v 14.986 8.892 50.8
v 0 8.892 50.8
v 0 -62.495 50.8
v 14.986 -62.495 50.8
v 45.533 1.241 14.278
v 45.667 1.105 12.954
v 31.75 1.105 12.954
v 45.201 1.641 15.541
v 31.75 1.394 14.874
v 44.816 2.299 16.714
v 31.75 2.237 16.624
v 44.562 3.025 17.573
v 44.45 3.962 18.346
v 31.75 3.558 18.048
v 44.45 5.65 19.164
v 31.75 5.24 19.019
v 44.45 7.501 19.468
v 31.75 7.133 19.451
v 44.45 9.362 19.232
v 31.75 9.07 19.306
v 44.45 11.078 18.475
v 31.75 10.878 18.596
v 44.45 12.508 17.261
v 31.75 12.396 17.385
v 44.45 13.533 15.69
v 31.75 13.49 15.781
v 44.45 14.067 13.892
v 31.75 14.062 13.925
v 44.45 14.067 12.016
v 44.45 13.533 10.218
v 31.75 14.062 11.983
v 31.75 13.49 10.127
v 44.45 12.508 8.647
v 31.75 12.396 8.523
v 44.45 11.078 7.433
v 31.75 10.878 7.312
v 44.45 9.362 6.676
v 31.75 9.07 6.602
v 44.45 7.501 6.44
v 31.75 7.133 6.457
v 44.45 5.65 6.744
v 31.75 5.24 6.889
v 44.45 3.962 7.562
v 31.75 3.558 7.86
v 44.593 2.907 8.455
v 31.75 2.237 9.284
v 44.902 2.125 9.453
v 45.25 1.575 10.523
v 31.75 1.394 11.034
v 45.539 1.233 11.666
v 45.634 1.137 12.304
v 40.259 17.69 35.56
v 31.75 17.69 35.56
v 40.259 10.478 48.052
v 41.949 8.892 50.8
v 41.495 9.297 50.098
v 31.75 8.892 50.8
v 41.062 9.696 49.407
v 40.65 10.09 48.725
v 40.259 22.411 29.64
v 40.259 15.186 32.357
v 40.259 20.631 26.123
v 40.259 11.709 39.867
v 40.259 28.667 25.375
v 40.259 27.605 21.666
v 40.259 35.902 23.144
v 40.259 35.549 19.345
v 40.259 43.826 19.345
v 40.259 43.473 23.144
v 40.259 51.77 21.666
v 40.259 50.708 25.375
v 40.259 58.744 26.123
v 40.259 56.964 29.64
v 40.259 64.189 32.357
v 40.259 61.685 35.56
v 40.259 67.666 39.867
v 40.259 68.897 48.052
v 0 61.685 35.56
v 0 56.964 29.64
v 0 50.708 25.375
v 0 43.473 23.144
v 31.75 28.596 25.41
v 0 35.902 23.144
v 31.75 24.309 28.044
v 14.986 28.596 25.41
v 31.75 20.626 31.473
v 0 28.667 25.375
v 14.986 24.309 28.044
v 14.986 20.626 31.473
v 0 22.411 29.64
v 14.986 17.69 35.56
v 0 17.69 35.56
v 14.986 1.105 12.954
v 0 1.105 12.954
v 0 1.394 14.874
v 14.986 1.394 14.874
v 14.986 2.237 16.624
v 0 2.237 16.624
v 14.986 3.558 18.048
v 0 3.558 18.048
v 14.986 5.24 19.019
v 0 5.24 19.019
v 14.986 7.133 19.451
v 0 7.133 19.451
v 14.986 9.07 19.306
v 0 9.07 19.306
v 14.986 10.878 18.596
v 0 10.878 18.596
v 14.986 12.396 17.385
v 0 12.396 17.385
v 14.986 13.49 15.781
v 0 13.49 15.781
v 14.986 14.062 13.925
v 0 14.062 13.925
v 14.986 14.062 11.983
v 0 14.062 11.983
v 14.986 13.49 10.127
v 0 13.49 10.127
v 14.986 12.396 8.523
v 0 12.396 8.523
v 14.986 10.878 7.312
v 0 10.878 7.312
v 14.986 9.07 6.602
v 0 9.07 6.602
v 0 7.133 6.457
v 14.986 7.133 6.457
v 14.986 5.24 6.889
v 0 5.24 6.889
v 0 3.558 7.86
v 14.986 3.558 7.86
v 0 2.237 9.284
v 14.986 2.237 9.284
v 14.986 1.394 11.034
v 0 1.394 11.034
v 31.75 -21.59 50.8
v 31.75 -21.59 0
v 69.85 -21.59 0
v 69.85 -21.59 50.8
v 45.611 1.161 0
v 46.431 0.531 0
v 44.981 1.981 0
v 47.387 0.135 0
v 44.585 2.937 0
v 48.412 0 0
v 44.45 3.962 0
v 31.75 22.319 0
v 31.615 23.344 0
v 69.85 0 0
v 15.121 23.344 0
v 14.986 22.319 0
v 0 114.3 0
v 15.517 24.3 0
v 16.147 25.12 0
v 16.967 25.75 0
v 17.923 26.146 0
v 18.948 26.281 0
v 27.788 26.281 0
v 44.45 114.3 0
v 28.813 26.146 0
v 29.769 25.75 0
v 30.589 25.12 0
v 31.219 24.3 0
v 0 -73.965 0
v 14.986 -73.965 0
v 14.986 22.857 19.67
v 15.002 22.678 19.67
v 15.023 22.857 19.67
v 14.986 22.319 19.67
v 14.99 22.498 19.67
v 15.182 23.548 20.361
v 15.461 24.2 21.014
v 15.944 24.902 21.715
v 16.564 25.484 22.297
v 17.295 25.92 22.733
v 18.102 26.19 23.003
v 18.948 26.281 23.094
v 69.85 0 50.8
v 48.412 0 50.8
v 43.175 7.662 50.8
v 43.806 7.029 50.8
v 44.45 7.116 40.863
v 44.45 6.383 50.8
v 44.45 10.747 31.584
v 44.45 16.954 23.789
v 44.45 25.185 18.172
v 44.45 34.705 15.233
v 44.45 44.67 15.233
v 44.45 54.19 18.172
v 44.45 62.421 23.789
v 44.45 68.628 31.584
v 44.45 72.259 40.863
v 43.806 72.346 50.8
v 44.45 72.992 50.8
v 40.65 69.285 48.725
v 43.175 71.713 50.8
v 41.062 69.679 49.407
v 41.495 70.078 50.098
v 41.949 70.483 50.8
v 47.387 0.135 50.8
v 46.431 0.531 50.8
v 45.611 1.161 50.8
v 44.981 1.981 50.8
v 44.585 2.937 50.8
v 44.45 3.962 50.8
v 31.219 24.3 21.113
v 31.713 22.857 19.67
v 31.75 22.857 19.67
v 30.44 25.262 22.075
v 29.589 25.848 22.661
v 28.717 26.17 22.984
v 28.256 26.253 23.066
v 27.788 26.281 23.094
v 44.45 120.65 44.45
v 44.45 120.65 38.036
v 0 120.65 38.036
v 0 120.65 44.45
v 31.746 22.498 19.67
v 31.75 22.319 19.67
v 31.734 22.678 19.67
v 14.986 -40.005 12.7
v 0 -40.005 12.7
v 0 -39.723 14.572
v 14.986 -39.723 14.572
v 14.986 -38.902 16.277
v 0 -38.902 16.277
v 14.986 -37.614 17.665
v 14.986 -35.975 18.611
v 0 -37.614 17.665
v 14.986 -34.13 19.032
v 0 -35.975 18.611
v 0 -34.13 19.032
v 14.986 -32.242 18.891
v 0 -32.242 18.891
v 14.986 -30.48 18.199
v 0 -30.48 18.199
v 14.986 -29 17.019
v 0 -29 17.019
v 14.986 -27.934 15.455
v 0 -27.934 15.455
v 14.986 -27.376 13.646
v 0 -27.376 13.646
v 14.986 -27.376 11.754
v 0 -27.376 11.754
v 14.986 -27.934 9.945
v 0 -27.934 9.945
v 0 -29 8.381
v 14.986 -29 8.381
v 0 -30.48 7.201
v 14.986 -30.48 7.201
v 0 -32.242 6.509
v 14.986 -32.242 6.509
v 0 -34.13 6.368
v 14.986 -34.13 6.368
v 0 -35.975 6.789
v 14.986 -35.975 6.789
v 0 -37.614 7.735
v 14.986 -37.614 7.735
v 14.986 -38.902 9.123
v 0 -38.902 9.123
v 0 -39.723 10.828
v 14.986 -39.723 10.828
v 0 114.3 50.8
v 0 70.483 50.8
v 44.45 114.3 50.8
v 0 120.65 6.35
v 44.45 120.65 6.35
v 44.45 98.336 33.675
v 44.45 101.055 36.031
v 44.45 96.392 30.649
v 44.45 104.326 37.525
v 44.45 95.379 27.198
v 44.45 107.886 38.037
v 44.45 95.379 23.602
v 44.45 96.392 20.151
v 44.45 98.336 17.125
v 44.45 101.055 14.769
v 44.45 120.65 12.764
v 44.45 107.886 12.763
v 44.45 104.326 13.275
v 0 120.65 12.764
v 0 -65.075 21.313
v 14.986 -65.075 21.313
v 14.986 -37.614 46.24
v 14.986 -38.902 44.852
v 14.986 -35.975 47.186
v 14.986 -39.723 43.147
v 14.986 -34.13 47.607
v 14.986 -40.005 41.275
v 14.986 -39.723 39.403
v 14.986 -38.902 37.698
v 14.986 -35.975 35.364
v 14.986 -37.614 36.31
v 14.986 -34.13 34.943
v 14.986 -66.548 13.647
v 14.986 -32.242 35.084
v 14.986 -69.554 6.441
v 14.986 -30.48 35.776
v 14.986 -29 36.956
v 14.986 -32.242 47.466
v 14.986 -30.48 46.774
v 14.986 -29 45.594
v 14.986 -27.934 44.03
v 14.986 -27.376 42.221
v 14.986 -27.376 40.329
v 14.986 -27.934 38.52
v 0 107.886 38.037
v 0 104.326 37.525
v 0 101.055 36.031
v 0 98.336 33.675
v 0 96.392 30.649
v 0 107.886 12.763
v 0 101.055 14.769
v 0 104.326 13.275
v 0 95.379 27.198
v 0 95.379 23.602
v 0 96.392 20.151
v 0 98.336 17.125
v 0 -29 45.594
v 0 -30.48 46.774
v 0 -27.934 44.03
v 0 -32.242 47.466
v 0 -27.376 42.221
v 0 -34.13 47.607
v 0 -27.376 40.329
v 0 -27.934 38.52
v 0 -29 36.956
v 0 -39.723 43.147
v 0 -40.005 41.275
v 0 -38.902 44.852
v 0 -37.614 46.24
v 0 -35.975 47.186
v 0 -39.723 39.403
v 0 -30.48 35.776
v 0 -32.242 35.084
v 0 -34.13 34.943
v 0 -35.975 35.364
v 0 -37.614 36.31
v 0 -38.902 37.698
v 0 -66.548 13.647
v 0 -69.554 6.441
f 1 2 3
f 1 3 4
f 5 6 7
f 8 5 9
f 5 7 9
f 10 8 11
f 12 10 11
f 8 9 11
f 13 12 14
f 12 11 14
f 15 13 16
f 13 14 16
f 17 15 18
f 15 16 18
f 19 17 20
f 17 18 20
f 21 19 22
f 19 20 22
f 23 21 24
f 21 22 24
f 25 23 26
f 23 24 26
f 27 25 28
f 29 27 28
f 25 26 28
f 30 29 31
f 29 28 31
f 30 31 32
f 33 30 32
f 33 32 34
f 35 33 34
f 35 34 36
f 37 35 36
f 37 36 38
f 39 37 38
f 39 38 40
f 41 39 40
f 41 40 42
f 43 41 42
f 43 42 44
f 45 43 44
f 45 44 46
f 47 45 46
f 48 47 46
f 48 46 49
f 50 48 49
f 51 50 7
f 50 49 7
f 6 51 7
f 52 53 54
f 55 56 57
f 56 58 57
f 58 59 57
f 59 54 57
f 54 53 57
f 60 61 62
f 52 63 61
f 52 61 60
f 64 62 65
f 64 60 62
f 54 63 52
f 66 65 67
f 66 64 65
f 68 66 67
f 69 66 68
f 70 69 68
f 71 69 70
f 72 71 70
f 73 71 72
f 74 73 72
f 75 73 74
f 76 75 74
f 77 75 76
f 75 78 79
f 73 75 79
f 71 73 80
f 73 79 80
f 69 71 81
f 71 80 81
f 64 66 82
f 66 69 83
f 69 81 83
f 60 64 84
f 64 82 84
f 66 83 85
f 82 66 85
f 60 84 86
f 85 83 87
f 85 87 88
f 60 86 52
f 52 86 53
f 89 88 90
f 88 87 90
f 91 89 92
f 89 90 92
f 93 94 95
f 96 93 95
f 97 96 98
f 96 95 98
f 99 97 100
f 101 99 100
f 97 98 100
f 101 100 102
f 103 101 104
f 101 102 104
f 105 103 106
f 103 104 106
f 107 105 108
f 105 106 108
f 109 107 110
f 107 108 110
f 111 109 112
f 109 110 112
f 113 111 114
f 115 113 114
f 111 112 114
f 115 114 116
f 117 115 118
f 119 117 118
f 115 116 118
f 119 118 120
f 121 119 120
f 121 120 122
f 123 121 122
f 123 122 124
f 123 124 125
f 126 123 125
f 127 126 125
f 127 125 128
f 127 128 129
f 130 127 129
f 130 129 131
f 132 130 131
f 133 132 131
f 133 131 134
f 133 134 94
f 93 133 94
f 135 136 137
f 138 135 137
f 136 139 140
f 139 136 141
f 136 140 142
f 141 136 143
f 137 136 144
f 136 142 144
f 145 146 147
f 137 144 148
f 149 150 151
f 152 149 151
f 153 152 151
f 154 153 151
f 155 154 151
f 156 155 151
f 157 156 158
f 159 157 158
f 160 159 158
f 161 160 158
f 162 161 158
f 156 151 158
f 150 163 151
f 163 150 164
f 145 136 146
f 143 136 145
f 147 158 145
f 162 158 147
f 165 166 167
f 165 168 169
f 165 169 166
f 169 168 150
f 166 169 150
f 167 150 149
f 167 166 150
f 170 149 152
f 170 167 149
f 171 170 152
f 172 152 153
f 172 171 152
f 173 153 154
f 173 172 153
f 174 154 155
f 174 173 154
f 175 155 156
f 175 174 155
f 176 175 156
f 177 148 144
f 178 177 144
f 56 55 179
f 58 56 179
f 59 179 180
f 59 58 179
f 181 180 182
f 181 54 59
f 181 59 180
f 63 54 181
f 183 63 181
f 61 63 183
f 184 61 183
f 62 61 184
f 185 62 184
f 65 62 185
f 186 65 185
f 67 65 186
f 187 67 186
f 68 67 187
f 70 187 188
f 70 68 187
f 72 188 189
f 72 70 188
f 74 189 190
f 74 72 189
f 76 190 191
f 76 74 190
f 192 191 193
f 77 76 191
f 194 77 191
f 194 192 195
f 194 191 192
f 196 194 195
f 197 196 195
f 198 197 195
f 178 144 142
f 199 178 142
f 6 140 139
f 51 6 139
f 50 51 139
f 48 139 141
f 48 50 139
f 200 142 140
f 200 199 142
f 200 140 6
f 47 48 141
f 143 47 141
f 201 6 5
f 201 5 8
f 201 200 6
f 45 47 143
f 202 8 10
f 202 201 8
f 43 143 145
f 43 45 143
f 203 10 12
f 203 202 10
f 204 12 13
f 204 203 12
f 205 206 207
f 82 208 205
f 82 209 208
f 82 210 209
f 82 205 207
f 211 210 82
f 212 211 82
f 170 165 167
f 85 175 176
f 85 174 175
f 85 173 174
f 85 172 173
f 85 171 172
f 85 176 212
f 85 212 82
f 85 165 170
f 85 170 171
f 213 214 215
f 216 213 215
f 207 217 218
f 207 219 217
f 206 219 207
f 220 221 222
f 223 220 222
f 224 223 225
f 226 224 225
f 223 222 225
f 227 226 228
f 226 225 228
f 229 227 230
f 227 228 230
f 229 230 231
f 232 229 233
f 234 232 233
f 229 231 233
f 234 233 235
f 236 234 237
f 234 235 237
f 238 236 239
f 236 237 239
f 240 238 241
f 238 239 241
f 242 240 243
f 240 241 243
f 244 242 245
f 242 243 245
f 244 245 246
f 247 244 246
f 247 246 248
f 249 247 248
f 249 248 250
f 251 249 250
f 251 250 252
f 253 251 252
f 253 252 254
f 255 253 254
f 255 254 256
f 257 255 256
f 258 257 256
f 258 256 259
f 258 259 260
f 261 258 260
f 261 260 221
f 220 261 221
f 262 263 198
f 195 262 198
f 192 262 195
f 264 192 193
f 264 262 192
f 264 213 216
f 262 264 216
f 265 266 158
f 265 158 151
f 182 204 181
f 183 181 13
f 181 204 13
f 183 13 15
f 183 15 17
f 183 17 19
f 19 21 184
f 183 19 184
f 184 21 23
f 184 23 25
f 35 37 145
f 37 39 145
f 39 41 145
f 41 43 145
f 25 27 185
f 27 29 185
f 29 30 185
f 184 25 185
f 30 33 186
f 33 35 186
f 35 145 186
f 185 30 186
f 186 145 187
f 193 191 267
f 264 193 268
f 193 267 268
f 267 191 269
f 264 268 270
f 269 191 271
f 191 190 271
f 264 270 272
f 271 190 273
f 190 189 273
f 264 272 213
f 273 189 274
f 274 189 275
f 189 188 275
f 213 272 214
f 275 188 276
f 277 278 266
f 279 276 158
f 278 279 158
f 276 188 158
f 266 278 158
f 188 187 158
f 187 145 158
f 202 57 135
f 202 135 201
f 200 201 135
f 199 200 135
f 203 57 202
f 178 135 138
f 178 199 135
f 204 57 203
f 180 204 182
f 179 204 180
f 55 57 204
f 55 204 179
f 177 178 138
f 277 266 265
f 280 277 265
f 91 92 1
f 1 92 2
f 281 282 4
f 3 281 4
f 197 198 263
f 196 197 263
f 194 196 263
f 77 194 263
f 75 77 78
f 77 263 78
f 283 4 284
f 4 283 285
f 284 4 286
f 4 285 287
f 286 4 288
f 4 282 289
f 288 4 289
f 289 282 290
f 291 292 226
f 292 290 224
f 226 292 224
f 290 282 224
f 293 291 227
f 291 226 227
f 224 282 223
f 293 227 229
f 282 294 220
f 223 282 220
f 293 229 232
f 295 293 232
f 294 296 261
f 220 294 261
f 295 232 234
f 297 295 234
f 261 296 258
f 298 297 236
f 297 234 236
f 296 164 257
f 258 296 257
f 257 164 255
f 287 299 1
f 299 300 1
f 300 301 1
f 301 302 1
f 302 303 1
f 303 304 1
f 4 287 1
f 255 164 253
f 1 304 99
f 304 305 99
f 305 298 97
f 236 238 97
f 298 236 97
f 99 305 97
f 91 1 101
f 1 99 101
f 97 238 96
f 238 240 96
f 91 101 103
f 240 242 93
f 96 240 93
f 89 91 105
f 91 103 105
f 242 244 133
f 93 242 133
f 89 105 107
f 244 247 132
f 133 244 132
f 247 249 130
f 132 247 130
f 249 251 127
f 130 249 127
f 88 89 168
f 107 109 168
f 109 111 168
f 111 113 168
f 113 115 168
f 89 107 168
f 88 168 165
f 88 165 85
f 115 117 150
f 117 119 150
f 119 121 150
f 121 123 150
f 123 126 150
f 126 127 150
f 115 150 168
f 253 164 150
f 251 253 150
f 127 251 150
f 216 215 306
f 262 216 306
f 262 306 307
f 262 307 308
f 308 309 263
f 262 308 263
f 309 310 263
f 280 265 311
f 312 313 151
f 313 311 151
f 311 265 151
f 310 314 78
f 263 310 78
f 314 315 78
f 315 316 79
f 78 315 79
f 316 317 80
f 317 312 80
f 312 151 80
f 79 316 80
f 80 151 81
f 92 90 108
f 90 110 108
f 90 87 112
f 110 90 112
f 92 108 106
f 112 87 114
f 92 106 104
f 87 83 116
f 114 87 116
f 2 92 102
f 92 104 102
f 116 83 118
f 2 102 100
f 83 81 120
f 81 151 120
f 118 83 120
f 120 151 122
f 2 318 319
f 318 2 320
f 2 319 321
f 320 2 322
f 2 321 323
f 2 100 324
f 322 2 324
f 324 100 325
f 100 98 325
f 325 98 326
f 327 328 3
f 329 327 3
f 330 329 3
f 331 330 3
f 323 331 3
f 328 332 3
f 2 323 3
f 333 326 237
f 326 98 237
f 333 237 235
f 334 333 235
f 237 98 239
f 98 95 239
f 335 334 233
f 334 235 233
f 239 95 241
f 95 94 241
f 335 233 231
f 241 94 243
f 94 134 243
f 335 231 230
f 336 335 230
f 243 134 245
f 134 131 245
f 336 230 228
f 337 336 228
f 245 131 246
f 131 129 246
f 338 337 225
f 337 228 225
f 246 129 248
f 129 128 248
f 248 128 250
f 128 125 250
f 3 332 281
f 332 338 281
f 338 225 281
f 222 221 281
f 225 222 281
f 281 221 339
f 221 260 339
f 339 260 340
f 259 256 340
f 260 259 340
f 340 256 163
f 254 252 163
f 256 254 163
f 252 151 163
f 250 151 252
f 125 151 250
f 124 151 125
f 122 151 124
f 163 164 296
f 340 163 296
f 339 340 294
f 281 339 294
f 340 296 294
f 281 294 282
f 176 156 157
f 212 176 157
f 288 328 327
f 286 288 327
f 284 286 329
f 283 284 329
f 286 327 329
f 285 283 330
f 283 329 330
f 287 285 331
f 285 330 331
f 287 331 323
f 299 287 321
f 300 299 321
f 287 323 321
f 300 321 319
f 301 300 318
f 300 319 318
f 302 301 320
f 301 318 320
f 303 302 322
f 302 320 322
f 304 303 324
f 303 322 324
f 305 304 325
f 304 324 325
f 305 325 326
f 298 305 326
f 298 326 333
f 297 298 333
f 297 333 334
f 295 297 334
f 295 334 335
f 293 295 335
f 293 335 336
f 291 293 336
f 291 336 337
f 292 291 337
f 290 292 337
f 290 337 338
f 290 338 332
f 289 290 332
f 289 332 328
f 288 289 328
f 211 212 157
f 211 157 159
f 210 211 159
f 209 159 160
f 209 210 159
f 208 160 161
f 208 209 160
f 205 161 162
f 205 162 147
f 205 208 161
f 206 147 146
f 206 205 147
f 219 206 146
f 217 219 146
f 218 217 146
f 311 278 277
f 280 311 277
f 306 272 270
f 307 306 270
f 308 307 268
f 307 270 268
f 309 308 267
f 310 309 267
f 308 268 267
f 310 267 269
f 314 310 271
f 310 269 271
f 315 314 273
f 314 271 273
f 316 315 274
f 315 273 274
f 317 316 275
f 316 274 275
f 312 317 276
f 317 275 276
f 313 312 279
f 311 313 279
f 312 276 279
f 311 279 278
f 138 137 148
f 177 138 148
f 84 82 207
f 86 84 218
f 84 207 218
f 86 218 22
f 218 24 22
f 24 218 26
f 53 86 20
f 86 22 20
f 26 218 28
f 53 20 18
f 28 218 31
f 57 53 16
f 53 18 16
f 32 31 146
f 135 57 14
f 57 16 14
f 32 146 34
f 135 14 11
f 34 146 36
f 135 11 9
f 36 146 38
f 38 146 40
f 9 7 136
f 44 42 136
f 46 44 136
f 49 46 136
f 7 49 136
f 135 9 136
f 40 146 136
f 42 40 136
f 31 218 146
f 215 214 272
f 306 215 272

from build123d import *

# Parameters (mm, degrees)
F1_DEPTH  = 50.8
F2_R      = 3.9624
F3_SIZE   = 6.35
F5_DEPTH  = 44.451
F7_D      = 13.0302
F9_DEPTH  = 69.851
F10_R     = 29.21
F11_DEPTH = 29.591
F12_SIZE  = 4.19099
F14_DEPTH = 14.9870001
F16_DEPTH = 16.764
F17_R     = 6.35
F18_DEPTH = 69.851


# Not quite as in the source:
# - a fillet or chamfer is up to 0.001 mm smaller than in the source, because OpenCascade refuses the exact size


with BuildPart() as f1:
    # F0 (on Top) → F1 (new body)
    with BuildSketch(Plane.XY):
        Polygon((44.45, 120.65), (0, 120.65), (0, 0), (0, -21.59), (0, -73.9648), (14.986, -73.9648), (14.986, 26.2809675187), (31.75, 26.2809675187), (31.75, -21.59), (69.85, -21.59), (69.85, 0), (44.45, 0), align=None)
    extrude(amount=F1_DEPTH)

    # F2
    f2_edges = [f1.edges().sort_by_distance(p)[0] for p in [
        (44.45, 0, 25.4),
        (14.986, 26.280968, 25.4),
        (31.75, 26.280968, 25.4),
    ]]
    fillet(f2_edges, radius=F2_R)

    # F3
    f3_edges = [f1.edges().sort_by_distance(p)[0] for p in [
        (22.225, 120.65, 50.8),
        (22.225, 120.65, 0),
    ]]
    chamfer(f3_edges, length=F3_SIZE)

    # F4 (on face) → F5 (cut, through all)
    with BuildSketch(Plane.YZ.offset(44.45)):
        with BuildLine():
            Line((120.65, 38.0365), (107.8865, 38.0365))
            ThreePointArc((107.8865, 38.0365), (95.25, 25.4), (107.8865, 12.7635))
            Line((107.8865, 12.7635), (120.65, 12.7635))
            Line((120.65, 12.7635), (120.65, 38.0365))
        make_face()
    extrude(amount=-F5_DEPTH, mode=Mode.SUBTRACT)

    # F7 (through all)
    with Locations(Plane.YZ.offset(69.85)):
        with Locations((7.62, 12.954)):
            Hole(F7_D / 2)

    # F8 (on face) → F9 (cut, through all)
    with BuildSketch(Plane(origin=(0, 0, 0), x_dir=(0, -1, 0), z_dir=(-1, 0, 0))):
        with BuildLine():
            Line((-8.8916366414, 50.8), (-70.4833633586, 50.8))
            Line((-70.4833633586, 50.8), (-61.6845452561, 35.56))
            ThreePointArc((-61.6845452561, 35.56), (-39.6875, 22.86), (-17.6904547439, 35.56))
            Line((-17.6904547439, 35.56), (-8.8916366414, 50.8))
        make_face()
    extrude(amount=-F9_DEPTH, mode=Mode.SUBTRACT)

    # F10 (on face) → F11 (cut)
    with BuildSketch(Plane.YZ.offset(69.85)):
        with Locations((39.6875, 48.26)):
            Circle(F10_R)
    extrude(amount=-F11_DEPTH, mode=Mode.SUBTRACT)

    # F12 (size 4.191 in the source; OpenCascade refuses exactly that, so slightly less here)
    f12_edges = [f1.edges().sort_by_distance(p)[0] for p in [
        (44.45, 39.6875, 19.05),
    ]]
    chamfer(f12_edges, length=F12_SIZE)

    # F13 (on face) → F14 (cut, through all)
    with BuildSketch(Plane.YZ.offset(14.986)):
        with BuildLine():
            Line((-73.9648, 50.8), (-73.9648, 0))
            ThreePointArc((-73.9648, 0), (-67.8661098873, 9.9669221787), (-65.0748, 21.3133818873))
            Line((-65.0748, 21.3133818873), (-62.4950551894, 50.8))
            Line((-62.4950551894, 50.8), (-73.9648, 50.8))
        make_face()
    extrude(amount=-F14_DEPTH, mode=Mode.SUBTRACT)

    # F15 (on face) → F16 (cut, through all)
    with BuildSketch(Plane.YZ.offset(14.986)):
        Polygon((11.9264439221, 19.6698105436), (22.8565887415, 19.6698105436), (41.9241071546, 38.7373289567), (11.9264439221, 38.7373289567), align=None)
    extrude(amount=F16_DEPTH, mode=Mode.SUBTRACT)

    # F17 (on face) → F18 (cut, through all)
    with BuildSketch(Plane(origin=(0, 0, 0), x_dir=(0, -1, 0), z_dir=(-1, 0, 0))):
        with Locations((33.655, 12.7)):
            Circle(F17_R)
        with Locations((33.655, 41.275)):
            Circle(F17_R)
    extrude(amount=-F18_DEPTH, mode=Mode.SUBTRACT)


solid = f1.part
